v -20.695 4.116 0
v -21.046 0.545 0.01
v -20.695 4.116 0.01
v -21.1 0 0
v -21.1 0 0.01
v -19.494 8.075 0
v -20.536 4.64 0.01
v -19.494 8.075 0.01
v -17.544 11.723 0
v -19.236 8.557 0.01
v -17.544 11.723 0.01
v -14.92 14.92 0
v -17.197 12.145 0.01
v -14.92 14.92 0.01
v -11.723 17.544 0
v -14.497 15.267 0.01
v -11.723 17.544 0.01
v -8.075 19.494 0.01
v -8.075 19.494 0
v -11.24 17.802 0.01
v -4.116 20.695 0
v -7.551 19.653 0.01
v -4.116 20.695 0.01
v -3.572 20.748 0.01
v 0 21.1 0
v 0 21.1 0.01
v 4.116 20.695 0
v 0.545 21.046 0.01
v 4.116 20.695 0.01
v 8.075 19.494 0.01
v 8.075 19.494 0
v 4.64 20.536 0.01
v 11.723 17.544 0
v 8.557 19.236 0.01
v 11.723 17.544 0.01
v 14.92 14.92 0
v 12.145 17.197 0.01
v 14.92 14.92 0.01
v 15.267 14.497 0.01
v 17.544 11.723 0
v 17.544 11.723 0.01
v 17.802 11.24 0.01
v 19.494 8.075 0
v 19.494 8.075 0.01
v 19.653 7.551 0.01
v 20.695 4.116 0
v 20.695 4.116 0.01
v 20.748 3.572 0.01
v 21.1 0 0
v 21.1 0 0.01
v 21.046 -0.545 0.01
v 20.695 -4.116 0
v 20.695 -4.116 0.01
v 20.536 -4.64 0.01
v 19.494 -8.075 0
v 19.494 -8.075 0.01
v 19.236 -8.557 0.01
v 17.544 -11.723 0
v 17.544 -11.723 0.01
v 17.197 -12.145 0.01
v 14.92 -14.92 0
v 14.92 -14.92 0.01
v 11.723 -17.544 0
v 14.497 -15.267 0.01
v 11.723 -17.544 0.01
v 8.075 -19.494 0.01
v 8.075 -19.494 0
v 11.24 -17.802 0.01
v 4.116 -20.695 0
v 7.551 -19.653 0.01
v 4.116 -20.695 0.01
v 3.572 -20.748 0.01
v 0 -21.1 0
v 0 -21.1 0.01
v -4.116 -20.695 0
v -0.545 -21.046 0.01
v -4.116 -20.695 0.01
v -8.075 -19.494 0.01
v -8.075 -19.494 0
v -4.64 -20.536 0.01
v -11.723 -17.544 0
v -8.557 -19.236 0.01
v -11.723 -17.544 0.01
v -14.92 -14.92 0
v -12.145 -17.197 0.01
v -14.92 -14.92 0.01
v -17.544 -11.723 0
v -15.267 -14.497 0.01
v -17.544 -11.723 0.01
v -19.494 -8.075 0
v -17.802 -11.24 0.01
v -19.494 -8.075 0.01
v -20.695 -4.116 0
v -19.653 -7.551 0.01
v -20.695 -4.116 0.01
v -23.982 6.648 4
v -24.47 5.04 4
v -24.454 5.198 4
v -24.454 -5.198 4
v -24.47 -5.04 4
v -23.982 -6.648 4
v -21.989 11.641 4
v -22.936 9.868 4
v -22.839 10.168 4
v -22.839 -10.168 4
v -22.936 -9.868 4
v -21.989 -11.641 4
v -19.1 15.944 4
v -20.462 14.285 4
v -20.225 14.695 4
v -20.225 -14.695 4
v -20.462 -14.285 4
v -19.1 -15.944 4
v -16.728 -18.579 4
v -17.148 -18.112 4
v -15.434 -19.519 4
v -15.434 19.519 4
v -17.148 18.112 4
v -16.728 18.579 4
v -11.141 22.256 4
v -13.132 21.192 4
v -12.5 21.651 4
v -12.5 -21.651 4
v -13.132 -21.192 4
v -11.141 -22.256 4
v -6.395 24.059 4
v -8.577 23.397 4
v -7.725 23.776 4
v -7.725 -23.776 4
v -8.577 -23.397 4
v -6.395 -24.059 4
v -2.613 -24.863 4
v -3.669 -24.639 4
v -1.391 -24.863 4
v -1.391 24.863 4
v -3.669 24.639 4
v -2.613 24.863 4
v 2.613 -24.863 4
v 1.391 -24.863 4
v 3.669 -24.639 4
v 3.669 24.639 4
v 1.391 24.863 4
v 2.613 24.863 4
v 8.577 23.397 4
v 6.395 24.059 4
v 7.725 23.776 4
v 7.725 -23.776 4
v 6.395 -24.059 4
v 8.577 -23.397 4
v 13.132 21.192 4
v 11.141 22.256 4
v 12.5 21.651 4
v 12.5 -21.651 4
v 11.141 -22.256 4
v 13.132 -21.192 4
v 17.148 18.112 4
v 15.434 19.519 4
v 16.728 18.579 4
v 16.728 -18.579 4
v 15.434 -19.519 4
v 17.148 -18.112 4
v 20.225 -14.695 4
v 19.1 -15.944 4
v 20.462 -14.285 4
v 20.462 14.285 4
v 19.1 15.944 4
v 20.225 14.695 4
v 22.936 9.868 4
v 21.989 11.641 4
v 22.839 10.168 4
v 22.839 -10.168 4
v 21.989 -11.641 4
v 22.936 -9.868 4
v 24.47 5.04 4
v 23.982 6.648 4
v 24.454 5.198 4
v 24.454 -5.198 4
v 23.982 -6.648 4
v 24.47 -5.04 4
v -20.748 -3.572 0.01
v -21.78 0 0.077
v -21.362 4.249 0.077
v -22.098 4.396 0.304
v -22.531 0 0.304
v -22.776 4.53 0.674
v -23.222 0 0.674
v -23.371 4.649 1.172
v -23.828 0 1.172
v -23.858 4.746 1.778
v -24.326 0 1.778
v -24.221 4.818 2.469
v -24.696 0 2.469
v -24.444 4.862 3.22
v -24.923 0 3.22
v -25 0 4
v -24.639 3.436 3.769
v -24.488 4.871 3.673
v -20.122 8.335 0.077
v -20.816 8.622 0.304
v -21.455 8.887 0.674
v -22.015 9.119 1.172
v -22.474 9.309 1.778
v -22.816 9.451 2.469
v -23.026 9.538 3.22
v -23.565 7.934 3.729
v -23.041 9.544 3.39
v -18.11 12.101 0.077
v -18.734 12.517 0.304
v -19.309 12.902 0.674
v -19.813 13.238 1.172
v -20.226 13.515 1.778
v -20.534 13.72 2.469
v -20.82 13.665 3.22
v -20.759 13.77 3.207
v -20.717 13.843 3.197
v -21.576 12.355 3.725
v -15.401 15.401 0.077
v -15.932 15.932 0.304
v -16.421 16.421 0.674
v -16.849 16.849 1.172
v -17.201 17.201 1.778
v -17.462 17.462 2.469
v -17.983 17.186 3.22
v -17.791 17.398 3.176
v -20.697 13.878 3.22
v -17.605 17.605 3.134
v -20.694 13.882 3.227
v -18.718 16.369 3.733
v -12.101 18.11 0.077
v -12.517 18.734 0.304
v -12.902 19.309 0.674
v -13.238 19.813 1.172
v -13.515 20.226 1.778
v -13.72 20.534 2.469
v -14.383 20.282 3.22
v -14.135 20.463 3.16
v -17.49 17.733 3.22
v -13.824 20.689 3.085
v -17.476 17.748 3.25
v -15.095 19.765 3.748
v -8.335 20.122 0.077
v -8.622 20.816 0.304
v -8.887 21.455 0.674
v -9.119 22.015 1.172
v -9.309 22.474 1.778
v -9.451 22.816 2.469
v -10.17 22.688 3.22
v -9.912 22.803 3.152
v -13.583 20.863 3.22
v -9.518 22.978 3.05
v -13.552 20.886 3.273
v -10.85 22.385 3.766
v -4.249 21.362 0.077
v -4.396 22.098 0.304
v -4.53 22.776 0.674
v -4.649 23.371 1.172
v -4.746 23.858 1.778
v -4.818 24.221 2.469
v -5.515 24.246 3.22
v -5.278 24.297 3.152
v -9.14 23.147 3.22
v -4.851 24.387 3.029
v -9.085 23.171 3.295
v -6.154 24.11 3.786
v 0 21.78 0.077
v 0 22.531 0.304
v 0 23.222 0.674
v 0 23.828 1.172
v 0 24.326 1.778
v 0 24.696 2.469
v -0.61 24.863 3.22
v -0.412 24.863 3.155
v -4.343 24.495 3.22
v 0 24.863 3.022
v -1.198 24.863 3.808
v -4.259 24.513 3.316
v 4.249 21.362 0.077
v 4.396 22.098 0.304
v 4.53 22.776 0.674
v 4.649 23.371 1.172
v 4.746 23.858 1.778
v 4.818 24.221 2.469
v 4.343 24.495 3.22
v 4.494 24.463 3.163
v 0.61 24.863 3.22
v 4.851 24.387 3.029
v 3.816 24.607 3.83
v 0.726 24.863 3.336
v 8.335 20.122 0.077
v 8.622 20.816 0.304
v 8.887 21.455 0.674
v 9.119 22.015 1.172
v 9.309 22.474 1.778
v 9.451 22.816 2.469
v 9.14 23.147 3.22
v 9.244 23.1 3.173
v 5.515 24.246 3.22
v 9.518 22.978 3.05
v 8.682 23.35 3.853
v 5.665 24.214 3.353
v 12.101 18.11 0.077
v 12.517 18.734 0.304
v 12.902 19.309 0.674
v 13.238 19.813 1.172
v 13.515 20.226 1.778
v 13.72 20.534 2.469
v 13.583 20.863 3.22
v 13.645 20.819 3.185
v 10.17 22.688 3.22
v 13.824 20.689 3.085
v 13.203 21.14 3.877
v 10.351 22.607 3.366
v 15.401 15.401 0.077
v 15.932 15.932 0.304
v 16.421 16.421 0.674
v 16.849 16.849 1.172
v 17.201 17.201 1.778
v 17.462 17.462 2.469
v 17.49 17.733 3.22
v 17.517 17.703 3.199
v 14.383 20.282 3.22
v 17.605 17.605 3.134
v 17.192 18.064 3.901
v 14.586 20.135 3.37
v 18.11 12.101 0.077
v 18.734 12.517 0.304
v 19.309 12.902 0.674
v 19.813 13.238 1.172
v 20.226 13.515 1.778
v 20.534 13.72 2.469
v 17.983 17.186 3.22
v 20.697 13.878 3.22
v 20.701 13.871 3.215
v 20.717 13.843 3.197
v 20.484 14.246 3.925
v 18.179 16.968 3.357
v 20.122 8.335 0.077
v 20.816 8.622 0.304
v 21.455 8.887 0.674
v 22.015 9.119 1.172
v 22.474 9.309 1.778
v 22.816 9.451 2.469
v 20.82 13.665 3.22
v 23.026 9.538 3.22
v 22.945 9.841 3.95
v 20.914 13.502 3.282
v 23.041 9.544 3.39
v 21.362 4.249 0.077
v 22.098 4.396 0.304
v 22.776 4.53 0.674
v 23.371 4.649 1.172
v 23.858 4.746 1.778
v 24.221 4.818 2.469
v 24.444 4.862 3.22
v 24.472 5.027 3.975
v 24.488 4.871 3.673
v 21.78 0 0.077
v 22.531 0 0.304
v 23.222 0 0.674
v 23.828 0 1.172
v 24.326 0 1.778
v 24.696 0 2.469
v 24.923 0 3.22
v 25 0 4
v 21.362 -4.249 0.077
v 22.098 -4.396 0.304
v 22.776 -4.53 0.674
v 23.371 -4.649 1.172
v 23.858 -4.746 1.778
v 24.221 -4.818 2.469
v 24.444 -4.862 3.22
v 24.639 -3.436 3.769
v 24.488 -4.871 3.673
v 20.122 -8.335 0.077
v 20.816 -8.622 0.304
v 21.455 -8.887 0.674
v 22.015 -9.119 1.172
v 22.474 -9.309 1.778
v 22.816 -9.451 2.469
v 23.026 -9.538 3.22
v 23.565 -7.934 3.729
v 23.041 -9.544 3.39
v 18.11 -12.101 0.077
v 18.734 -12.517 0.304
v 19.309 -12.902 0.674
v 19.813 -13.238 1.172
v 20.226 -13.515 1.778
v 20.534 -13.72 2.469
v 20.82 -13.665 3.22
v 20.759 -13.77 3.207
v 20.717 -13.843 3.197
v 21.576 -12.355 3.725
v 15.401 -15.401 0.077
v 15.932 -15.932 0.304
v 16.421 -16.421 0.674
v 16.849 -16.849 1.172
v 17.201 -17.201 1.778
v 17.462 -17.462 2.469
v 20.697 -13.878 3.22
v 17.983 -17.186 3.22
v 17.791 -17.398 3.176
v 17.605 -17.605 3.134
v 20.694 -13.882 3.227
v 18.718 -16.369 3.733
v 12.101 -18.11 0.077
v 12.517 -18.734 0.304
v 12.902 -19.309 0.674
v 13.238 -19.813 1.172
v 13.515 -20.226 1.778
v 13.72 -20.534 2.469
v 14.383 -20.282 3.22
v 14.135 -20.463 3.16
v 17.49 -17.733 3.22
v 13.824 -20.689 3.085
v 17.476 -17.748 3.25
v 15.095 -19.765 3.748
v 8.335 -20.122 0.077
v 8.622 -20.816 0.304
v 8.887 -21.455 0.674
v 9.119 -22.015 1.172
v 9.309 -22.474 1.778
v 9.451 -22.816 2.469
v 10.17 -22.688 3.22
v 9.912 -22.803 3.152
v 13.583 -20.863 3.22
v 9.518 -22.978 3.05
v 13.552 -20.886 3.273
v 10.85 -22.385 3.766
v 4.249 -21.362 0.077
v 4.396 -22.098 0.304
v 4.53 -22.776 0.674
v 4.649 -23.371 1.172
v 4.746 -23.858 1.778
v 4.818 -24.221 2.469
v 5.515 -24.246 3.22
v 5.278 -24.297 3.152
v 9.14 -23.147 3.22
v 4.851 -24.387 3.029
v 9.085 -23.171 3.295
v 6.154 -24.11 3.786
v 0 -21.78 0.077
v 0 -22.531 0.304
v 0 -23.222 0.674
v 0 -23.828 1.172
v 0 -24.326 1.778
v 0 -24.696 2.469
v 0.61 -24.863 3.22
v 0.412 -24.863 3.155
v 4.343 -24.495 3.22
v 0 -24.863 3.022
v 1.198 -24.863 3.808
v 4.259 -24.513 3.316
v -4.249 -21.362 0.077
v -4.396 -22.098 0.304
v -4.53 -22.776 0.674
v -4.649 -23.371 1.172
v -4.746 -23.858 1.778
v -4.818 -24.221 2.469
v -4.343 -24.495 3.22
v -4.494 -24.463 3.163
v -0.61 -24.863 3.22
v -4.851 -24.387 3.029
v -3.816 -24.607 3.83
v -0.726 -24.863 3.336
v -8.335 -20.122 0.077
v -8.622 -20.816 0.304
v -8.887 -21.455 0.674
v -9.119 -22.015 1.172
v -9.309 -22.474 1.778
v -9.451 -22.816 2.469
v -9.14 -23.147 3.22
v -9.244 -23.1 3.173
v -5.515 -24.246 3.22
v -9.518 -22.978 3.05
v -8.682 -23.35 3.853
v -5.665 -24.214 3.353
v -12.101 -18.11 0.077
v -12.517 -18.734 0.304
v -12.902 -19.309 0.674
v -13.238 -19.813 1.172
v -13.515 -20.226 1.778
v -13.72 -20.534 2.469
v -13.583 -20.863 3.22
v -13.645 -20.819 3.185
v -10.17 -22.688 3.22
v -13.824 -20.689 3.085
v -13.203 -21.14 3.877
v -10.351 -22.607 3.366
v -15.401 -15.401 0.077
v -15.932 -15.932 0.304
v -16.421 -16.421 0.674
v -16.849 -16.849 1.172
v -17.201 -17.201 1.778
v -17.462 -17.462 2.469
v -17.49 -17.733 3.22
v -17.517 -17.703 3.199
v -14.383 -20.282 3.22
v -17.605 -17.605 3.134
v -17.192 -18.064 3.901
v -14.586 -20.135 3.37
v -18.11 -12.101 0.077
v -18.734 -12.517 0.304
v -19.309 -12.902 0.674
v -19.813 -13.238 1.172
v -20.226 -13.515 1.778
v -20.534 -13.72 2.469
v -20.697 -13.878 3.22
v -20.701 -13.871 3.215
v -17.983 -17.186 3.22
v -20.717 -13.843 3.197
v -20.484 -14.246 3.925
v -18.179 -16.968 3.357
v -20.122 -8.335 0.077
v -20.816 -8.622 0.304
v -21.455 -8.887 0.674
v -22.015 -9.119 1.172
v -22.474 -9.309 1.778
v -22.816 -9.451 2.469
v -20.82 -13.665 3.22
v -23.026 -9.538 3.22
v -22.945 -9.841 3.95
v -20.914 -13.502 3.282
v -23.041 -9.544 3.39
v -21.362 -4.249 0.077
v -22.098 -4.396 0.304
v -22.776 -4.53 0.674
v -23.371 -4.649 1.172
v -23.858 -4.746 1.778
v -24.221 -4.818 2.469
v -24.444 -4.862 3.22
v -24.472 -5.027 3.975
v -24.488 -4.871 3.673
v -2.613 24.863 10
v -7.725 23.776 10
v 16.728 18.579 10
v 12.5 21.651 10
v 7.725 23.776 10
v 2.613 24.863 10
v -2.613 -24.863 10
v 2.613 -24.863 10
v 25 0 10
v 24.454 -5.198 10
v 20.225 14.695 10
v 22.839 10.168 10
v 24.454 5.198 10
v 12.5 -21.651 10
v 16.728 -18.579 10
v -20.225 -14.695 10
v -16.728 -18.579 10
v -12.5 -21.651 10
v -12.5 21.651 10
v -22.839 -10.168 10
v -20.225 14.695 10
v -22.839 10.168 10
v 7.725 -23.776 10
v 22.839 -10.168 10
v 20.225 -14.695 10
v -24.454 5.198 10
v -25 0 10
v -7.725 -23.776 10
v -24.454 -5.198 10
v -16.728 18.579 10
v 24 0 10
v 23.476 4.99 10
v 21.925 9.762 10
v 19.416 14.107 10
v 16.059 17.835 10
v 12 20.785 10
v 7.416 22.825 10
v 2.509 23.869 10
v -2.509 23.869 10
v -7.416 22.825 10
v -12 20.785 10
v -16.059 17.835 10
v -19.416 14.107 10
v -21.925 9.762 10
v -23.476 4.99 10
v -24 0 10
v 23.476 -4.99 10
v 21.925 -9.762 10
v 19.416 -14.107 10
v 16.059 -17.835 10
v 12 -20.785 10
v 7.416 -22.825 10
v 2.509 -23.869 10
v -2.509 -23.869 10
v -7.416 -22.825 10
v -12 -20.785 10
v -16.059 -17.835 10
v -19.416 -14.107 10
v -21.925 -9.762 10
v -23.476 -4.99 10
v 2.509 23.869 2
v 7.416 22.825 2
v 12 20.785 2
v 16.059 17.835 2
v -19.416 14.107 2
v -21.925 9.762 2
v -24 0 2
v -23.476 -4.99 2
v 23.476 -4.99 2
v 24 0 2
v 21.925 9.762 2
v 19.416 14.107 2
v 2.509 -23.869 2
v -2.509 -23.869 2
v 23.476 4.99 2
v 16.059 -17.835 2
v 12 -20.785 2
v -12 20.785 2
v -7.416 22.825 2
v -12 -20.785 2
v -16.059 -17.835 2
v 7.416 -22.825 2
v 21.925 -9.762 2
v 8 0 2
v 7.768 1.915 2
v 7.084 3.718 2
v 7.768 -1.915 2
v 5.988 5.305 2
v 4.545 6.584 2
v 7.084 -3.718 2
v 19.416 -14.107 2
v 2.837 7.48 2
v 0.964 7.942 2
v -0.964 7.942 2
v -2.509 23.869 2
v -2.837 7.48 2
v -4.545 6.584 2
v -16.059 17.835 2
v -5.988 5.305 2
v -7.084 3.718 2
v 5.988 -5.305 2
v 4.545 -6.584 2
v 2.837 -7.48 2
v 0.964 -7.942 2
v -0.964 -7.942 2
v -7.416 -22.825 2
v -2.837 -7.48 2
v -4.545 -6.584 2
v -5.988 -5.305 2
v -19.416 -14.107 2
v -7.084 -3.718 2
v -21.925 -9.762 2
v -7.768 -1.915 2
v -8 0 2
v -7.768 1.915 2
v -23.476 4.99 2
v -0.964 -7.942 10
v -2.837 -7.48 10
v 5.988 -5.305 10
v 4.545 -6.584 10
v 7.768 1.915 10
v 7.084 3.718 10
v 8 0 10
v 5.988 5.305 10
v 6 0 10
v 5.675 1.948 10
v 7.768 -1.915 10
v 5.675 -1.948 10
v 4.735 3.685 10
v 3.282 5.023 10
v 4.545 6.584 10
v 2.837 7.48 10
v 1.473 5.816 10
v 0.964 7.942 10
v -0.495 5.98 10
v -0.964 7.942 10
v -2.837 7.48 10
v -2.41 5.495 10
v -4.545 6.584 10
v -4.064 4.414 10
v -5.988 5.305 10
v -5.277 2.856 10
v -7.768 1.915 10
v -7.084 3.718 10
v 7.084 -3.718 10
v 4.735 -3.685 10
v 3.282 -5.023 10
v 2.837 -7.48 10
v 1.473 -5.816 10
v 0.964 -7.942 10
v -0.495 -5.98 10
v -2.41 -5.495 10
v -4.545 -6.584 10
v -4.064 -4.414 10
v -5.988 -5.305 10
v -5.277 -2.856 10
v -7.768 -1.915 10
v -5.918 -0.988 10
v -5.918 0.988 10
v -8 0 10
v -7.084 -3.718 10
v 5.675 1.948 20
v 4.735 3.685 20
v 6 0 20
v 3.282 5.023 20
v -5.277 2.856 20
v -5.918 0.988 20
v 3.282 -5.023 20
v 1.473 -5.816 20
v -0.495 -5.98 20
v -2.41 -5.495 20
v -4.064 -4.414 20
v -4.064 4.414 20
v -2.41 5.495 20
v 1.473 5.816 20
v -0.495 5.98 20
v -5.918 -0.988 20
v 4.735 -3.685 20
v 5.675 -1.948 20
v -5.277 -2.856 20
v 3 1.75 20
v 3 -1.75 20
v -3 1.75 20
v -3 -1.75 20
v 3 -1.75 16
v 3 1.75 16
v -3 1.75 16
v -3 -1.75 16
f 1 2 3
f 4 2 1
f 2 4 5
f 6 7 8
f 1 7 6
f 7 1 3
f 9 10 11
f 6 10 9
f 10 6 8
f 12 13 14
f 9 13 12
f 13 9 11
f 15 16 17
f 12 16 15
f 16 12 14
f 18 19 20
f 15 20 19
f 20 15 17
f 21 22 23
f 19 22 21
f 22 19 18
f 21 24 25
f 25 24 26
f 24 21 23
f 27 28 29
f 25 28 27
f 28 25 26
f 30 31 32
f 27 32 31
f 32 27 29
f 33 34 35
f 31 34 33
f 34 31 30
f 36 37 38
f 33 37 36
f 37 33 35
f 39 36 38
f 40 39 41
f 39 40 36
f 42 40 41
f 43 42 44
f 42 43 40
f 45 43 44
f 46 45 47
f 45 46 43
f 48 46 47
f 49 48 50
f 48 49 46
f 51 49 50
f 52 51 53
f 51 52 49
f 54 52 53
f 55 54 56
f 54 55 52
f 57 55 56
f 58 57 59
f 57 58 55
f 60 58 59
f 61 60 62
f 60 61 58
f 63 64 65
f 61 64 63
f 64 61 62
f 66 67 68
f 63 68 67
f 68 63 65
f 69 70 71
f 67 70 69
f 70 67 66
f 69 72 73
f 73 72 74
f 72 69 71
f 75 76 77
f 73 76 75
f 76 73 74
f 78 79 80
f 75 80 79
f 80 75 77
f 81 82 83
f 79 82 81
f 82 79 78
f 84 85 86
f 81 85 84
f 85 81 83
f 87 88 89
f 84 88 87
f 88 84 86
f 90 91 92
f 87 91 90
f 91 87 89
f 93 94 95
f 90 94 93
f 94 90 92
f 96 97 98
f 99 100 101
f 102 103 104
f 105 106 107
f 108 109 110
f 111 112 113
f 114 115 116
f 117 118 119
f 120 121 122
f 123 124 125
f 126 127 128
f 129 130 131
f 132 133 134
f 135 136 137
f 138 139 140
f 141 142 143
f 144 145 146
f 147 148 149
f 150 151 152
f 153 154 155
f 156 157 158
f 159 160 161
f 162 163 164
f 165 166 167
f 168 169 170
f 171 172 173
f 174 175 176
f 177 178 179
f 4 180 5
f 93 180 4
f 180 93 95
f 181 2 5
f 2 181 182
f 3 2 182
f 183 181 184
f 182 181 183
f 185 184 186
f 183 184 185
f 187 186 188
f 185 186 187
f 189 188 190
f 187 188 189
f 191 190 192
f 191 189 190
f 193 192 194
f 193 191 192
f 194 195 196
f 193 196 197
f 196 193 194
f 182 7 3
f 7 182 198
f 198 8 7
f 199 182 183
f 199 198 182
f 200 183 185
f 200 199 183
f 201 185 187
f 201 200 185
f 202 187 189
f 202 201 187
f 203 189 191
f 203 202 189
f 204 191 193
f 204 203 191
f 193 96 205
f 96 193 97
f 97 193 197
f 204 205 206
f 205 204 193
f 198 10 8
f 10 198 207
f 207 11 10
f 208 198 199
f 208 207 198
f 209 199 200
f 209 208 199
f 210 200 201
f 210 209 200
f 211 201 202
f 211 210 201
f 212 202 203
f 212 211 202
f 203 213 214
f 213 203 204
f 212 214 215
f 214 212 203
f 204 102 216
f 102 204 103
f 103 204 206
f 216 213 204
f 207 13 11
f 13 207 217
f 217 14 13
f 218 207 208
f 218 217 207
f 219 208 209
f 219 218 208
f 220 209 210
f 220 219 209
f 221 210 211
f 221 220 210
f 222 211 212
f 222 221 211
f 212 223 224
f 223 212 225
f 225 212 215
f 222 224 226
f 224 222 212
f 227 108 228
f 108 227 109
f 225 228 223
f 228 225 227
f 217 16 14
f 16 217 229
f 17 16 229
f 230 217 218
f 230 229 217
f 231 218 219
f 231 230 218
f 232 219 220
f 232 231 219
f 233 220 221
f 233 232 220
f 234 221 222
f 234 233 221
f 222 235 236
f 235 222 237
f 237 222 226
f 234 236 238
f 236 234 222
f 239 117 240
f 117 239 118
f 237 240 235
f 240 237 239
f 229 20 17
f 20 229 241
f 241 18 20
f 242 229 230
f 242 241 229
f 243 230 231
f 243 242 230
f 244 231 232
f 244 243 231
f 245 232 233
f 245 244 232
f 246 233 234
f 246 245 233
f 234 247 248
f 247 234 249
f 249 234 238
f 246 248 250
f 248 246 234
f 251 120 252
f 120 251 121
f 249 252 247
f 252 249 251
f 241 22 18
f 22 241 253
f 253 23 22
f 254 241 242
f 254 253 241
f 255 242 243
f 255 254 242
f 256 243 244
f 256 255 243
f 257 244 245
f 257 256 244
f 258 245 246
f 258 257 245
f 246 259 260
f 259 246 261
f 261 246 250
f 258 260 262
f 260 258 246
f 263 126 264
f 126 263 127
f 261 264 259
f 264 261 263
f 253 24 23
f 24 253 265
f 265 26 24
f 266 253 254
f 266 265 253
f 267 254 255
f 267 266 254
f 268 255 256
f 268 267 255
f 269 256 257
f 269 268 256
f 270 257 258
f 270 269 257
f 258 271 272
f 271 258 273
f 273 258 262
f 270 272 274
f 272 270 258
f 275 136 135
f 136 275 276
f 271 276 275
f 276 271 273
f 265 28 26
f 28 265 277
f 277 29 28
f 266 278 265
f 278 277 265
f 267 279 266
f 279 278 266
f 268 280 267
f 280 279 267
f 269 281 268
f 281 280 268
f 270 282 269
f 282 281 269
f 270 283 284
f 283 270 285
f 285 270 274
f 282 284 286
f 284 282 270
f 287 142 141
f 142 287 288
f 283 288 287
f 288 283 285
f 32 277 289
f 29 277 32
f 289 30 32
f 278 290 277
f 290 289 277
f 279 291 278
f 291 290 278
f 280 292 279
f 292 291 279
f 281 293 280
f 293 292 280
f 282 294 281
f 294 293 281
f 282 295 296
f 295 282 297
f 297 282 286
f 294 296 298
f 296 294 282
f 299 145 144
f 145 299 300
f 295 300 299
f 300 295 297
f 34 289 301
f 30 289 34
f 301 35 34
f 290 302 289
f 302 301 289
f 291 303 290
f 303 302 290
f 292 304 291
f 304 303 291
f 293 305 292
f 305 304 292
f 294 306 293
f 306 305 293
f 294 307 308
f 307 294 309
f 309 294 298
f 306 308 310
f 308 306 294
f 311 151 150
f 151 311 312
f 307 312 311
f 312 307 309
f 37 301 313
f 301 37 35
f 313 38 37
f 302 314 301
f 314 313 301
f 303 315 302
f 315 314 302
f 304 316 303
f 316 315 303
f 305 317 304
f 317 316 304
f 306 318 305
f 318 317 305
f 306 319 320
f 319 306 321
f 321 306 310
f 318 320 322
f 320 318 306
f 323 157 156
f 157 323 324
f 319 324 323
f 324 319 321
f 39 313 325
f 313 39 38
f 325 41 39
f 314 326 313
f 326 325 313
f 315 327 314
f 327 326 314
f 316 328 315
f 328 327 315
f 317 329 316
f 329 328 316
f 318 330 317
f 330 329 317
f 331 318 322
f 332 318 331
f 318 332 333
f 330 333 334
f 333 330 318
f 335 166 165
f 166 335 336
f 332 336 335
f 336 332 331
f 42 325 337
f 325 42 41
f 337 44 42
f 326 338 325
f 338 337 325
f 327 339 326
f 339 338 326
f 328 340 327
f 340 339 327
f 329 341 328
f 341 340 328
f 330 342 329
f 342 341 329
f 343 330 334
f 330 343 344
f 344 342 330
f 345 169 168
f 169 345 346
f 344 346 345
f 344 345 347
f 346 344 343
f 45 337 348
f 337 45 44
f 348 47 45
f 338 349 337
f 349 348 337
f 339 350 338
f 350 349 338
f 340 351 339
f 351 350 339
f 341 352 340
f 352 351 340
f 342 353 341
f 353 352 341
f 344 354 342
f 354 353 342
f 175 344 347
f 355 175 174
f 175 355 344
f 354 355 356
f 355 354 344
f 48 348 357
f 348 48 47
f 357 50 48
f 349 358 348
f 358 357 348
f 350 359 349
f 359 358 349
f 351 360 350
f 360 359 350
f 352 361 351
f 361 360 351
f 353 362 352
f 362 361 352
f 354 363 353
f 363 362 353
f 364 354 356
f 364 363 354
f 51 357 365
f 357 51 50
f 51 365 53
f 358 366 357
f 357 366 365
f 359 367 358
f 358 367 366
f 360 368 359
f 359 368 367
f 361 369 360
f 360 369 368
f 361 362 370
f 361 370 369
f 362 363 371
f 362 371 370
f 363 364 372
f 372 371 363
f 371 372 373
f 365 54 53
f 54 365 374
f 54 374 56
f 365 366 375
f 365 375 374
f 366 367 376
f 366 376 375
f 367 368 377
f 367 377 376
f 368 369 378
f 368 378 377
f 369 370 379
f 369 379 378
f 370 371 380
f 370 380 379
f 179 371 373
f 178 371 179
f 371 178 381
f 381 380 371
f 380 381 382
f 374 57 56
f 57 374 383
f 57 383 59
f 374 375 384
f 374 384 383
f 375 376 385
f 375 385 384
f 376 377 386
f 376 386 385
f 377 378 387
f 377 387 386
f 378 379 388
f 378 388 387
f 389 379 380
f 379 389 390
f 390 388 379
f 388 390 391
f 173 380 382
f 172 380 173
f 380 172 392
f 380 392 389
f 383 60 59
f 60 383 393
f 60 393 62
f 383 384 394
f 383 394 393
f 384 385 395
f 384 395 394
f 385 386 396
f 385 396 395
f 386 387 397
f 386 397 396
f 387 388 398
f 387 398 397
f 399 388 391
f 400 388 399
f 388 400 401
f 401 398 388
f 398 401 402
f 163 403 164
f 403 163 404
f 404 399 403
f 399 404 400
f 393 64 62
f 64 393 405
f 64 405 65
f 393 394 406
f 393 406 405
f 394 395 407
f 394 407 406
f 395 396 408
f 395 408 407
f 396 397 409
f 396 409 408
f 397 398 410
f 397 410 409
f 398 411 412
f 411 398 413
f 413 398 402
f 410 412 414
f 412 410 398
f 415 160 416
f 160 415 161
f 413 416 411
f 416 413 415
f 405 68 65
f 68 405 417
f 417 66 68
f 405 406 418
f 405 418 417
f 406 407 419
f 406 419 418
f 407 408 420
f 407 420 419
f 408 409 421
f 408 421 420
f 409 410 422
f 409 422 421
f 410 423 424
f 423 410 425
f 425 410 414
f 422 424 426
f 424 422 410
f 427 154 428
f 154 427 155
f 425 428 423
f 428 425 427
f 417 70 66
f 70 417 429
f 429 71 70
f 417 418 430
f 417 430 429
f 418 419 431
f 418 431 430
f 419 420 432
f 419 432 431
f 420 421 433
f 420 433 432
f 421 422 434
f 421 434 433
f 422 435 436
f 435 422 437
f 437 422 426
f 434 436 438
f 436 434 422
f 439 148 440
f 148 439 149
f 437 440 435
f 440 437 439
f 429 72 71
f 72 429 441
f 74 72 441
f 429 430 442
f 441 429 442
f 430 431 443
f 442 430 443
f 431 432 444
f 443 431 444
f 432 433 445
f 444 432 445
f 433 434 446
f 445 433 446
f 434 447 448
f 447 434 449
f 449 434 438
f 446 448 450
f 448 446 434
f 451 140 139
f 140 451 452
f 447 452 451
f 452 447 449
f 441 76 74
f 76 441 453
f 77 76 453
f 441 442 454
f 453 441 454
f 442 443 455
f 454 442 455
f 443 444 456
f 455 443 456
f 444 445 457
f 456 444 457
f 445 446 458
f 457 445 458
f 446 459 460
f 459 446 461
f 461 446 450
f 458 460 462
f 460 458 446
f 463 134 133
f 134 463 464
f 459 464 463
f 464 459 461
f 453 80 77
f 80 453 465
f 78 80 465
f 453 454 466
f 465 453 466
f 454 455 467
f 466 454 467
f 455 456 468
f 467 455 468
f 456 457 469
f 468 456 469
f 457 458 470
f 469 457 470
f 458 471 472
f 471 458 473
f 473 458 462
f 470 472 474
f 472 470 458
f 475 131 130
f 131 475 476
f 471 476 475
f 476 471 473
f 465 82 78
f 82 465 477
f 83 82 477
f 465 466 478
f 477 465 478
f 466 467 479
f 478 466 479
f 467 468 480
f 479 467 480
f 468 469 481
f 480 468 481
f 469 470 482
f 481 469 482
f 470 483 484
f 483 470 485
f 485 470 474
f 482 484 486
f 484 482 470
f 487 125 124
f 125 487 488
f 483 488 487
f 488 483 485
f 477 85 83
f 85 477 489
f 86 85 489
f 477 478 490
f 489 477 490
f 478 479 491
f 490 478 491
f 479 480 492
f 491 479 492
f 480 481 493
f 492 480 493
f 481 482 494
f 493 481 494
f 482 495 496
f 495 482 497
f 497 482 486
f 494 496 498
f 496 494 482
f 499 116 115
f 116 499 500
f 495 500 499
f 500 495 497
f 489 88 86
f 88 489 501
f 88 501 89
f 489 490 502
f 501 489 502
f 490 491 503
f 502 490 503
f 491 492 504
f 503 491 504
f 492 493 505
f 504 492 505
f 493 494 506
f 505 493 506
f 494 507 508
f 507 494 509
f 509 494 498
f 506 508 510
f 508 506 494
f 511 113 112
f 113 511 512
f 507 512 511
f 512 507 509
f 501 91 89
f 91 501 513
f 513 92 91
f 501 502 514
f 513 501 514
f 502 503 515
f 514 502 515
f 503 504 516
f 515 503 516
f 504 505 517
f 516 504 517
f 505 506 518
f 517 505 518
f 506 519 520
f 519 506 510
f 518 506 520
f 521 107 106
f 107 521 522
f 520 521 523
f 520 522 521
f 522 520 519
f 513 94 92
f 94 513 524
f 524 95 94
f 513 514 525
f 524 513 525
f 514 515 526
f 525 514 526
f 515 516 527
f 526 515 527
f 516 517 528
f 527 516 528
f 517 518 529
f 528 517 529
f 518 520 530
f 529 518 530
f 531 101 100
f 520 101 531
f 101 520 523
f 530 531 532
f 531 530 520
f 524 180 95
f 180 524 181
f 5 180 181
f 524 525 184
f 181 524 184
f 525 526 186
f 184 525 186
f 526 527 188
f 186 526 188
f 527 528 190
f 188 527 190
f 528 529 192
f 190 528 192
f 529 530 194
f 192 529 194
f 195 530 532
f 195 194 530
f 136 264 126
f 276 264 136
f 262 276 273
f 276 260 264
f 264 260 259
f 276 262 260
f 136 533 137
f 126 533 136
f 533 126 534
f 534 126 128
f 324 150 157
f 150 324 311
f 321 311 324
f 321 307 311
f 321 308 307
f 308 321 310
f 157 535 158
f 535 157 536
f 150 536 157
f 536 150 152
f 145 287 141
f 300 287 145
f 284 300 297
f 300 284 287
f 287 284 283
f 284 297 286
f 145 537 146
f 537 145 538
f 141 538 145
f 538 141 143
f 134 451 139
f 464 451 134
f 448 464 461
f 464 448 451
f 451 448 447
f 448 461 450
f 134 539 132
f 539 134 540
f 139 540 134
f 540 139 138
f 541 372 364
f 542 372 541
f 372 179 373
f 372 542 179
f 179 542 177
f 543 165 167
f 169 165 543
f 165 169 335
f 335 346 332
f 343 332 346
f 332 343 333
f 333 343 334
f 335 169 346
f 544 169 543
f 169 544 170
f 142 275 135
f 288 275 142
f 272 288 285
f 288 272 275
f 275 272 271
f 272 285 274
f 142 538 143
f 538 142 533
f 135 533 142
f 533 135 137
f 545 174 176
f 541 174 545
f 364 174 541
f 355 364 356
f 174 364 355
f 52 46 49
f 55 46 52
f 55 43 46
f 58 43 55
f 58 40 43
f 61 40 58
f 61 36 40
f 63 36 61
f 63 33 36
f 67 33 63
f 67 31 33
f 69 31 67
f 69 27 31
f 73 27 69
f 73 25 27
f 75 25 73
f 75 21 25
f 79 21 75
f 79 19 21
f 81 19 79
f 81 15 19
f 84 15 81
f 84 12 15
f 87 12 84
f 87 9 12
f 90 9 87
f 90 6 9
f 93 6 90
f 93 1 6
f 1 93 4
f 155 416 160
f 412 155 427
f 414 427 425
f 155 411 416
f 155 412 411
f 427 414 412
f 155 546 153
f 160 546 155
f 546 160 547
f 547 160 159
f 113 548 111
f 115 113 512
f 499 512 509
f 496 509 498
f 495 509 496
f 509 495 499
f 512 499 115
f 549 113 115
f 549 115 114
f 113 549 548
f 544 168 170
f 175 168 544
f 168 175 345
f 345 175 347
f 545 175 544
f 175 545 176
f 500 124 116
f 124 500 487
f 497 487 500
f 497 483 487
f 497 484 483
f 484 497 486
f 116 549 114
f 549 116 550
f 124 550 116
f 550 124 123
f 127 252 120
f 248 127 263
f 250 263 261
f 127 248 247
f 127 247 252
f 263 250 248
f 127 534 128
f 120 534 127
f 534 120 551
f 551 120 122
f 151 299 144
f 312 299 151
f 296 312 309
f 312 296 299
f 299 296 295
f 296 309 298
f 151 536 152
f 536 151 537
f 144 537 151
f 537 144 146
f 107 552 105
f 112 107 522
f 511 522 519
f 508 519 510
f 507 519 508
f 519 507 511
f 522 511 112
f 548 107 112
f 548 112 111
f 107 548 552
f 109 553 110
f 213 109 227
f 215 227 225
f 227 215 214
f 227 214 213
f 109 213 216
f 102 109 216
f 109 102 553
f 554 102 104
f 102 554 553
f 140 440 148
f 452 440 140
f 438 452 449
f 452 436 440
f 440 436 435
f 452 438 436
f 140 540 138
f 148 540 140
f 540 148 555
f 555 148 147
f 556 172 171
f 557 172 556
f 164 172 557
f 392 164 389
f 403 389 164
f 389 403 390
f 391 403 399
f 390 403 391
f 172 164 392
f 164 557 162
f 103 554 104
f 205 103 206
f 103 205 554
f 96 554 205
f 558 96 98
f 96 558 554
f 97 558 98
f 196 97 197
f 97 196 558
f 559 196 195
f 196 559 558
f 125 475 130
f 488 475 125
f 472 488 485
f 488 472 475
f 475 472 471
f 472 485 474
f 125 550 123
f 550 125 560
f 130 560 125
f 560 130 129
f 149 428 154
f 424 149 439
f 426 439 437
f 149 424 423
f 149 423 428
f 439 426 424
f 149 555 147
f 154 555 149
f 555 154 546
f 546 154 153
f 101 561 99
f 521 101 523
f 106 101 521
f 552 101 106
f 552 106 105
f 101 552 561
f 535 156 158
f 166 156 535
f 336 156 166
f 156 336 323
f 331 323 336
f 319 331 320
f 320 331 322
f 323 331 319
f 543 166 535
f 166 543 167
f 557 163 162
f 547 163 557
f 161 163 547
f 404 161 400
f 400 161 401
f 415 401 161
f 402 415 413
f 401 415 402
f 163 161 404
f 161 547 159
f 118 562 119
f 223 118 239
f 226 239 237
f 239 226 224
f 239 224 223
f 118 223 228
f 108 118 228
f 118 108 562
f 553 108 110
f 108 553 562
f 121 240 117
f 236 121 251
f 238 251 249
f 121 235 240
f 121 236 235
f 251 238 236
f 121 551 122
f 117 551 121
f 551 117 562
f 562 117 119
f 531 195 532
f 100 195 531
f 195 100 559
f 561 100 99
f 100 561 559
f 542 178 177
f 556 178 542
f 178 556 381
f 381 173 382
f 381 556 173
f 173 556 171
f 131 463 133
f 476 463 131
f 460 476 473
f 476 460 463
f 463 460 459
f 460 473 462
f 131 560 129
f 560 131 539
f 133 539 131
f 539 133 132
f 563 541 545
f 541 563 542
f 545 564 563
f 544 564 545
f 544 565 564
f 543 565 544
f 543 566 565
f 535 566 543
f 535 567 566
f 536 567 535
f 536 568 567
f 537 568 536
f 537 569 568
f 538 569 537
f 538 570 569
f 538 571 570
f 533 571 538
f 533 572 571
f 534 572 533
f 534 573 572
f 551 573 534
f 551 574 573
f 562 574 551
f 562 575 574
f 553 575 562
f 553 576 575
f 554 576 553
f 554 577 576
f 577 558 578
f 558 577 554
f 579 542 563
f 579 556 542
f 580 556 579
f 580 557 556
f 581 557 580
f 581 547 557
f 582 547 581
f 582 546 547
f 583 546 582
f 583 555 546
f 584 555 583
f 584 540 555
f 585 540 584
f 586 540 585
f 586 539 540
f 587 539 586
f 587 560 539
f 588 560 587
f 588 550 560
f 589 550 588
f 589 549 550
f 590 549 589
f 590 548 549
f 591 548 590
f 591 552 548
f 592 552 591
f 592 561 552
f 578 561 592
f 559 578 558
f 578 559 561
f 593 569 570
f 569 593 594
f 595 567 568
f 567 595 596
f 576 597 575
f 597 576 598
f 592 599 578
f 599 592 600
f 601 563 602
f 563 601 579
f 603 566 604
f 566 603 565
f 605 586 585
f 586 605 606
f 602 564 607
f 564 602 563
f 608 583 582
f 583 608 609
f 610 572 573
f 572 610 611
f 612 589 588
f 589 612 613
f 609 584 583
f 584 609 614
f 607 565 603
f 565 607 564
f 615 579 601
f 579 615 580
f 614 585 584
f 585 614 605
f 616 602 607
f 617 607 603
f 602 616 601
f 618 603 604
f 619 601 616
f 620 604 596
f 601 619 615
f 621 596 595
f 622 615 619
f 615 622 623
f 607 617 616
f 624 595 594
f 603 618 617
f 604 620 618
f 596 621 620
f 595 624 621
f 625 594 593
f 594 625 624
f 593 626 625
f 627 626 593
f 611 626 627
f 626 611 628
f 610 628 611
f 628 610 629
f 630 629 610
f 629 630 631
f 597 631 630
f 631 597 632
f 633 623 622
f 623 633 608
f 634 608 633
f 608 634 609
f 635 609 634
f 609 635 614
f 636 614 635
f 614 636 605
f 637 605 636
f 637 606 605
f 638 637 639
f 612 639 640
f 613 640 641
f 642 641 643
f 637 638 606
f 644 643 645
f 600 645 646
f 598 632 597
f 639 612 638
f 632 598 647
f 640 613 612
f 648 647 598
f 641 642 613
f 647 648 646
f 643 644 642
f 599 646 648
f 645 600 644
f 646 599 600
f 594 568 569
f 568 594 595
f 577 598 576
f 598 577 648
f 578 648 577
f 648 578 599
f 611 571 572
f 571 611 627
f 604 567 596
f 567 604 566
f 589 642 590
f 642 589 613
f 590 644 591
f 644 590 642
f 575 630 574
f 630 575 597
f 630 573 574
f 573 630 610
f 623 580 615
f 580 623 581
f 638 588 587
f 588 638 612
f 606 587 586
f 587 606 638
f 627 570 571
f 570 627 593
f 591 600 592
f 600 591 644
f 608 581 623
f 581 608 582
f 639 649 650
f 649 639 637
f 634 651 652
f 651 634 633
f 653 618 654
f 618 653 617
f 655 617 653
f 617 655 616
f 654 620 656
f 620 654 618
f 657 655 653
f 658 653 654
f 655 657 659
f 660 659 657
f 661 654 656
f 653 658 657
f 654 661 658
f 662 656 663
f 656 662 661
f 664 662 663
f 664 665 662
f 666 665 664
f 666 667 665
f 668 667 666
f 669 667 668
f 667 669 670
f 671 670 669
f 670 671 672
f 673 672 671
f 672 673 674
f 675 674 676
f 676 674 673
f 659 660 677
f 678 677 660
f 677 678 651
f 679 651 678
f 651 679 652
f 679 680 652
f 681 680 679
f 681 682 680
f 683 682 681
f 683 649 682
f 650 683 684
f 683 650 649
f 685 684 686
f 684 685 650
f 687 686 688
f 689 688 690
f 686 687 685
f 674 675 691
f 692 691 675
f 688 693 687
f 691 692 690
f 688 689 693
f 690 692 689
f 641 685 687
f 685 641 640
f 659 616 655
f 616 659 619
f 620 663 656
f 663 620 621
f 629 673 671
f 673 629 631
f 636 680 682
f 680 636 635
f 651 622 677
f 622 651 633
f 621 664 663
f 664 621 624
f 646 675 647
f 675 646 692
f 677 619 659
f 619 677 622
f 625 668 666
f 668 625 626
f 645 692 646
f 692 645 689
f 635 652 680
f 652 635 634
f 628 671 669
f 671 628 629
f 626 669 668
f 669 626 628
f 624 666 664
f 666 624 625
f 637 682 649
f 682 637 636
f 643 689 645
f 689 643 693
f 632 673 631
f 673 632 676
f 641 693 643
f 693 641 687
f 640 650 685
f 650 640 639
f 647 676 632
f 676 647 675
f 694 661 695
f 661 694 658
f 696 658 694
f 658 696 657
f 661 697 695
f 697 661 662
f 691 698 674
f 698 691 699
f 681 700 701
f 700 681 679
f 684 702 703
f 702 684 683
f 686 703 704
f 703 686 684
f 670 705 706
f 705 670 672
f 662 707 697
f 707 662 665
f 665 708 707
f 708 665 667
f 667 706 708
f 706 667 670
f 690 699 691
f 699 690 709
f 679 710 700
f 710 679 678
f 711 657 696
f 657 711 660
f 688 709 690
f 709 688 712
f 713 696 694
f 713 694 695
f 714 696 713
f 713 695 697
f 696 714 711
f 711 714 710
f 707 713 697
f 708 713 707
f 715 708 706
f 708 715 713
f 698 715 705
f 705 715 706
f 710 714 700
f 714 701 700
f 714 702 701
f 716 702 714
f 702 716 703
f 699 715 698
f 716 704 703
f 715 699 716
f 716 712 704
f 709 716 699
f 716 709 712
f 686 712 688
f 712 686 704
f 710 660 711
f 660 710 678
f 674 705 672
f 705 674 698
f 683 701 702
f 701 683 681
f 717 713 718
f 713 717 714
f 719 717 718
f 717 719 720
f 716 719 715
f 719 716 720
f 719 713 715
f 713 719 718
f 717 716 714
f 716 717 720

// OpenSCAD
// These settings worked with my printer for a Koni Yellow adjustable shock.
// Your results may vary - adjust if necessary (scaling the model could work too).

/* [Tool Head] */

// The X in mm of the shock adjustor head
shock_adjuster_x = 6; 
// Y in mm of the shock adjustor head
shock_adjuster_y = 3.5;
// depth for the tool head.
shock_adjuster_height = 4;

// You probably don't need to change these but they're around for you anyway.

/* [Advanced Dimensions] */

// The radius of the outer "gripper" component
grip_radius = 25;
// The thickness of the "gripper" piece.
gripper_thickness = 2; // Less than 2mm seems pretty weak in ABS.
// The height of the gripper piece.
gripper_height = 10; // Less than 1cm is hard to grip
// The center cylinder which supports the narrow tool head
center_reinforcement_radius = 8;
// The length which the tool head extends beyond the gripper
tool_head_height = 10;
// The radius of the actual tool head
tool_head_radius = 6; 

/* [Rounded Corners] */

// Prevents "dangling" edges from the cylinder by making the rounded edge a bit bigger.
pad = .1; // Too low and you'll get non-manifold parts. Too high and you'll get gaps.

// Radius of the rounded edge.
round_radius = 4;
// How smooth to make the rounded edge
round_smooth = 32;	// Higher = smoother but big STL.

//Gripper
difference(){
	union(){
		// Hand-holder cylinder
		cylinder(r=grip_radius,h=gripper_height);
	}
	translate([0,0,0]){
		translate([0,0,gripper_thickness])
			cylinder(r=grip_radius - gripper_thickness / 2, h=gripper_height);
	}
// Bottom Round
	difference() {
		rotate_extrude(convexity=10,  $fn = round_smooth)
			translate([grip_radius-round_radius+pad,-pad,0])
				square(round_radius+pad,round_radius+pad);
		rotate_extrude(convexity=10,  $fn = round_smooth)
			translate([grip_radius-round_radius,round_radius,0])
				circle(r=round_radius,$fn=round_smooth);
	}
}
// Adjustment head
difference(){
	union(){
		// center cylinder taper (support)
		cylinder(r=center_reinforcement_radius, h=10);
    //center cylinder
		cylinder(r=tool_head_radius, h=gripper_height+tool_head_height);
	}
	// Cut-out for shock adjustor
	translate([0,0,gripper_height+tool_head_height])
		cube(size=[shock_adjuster_x,shock_adjuster_y,shock_adjuster_height*2], center=true);
}
